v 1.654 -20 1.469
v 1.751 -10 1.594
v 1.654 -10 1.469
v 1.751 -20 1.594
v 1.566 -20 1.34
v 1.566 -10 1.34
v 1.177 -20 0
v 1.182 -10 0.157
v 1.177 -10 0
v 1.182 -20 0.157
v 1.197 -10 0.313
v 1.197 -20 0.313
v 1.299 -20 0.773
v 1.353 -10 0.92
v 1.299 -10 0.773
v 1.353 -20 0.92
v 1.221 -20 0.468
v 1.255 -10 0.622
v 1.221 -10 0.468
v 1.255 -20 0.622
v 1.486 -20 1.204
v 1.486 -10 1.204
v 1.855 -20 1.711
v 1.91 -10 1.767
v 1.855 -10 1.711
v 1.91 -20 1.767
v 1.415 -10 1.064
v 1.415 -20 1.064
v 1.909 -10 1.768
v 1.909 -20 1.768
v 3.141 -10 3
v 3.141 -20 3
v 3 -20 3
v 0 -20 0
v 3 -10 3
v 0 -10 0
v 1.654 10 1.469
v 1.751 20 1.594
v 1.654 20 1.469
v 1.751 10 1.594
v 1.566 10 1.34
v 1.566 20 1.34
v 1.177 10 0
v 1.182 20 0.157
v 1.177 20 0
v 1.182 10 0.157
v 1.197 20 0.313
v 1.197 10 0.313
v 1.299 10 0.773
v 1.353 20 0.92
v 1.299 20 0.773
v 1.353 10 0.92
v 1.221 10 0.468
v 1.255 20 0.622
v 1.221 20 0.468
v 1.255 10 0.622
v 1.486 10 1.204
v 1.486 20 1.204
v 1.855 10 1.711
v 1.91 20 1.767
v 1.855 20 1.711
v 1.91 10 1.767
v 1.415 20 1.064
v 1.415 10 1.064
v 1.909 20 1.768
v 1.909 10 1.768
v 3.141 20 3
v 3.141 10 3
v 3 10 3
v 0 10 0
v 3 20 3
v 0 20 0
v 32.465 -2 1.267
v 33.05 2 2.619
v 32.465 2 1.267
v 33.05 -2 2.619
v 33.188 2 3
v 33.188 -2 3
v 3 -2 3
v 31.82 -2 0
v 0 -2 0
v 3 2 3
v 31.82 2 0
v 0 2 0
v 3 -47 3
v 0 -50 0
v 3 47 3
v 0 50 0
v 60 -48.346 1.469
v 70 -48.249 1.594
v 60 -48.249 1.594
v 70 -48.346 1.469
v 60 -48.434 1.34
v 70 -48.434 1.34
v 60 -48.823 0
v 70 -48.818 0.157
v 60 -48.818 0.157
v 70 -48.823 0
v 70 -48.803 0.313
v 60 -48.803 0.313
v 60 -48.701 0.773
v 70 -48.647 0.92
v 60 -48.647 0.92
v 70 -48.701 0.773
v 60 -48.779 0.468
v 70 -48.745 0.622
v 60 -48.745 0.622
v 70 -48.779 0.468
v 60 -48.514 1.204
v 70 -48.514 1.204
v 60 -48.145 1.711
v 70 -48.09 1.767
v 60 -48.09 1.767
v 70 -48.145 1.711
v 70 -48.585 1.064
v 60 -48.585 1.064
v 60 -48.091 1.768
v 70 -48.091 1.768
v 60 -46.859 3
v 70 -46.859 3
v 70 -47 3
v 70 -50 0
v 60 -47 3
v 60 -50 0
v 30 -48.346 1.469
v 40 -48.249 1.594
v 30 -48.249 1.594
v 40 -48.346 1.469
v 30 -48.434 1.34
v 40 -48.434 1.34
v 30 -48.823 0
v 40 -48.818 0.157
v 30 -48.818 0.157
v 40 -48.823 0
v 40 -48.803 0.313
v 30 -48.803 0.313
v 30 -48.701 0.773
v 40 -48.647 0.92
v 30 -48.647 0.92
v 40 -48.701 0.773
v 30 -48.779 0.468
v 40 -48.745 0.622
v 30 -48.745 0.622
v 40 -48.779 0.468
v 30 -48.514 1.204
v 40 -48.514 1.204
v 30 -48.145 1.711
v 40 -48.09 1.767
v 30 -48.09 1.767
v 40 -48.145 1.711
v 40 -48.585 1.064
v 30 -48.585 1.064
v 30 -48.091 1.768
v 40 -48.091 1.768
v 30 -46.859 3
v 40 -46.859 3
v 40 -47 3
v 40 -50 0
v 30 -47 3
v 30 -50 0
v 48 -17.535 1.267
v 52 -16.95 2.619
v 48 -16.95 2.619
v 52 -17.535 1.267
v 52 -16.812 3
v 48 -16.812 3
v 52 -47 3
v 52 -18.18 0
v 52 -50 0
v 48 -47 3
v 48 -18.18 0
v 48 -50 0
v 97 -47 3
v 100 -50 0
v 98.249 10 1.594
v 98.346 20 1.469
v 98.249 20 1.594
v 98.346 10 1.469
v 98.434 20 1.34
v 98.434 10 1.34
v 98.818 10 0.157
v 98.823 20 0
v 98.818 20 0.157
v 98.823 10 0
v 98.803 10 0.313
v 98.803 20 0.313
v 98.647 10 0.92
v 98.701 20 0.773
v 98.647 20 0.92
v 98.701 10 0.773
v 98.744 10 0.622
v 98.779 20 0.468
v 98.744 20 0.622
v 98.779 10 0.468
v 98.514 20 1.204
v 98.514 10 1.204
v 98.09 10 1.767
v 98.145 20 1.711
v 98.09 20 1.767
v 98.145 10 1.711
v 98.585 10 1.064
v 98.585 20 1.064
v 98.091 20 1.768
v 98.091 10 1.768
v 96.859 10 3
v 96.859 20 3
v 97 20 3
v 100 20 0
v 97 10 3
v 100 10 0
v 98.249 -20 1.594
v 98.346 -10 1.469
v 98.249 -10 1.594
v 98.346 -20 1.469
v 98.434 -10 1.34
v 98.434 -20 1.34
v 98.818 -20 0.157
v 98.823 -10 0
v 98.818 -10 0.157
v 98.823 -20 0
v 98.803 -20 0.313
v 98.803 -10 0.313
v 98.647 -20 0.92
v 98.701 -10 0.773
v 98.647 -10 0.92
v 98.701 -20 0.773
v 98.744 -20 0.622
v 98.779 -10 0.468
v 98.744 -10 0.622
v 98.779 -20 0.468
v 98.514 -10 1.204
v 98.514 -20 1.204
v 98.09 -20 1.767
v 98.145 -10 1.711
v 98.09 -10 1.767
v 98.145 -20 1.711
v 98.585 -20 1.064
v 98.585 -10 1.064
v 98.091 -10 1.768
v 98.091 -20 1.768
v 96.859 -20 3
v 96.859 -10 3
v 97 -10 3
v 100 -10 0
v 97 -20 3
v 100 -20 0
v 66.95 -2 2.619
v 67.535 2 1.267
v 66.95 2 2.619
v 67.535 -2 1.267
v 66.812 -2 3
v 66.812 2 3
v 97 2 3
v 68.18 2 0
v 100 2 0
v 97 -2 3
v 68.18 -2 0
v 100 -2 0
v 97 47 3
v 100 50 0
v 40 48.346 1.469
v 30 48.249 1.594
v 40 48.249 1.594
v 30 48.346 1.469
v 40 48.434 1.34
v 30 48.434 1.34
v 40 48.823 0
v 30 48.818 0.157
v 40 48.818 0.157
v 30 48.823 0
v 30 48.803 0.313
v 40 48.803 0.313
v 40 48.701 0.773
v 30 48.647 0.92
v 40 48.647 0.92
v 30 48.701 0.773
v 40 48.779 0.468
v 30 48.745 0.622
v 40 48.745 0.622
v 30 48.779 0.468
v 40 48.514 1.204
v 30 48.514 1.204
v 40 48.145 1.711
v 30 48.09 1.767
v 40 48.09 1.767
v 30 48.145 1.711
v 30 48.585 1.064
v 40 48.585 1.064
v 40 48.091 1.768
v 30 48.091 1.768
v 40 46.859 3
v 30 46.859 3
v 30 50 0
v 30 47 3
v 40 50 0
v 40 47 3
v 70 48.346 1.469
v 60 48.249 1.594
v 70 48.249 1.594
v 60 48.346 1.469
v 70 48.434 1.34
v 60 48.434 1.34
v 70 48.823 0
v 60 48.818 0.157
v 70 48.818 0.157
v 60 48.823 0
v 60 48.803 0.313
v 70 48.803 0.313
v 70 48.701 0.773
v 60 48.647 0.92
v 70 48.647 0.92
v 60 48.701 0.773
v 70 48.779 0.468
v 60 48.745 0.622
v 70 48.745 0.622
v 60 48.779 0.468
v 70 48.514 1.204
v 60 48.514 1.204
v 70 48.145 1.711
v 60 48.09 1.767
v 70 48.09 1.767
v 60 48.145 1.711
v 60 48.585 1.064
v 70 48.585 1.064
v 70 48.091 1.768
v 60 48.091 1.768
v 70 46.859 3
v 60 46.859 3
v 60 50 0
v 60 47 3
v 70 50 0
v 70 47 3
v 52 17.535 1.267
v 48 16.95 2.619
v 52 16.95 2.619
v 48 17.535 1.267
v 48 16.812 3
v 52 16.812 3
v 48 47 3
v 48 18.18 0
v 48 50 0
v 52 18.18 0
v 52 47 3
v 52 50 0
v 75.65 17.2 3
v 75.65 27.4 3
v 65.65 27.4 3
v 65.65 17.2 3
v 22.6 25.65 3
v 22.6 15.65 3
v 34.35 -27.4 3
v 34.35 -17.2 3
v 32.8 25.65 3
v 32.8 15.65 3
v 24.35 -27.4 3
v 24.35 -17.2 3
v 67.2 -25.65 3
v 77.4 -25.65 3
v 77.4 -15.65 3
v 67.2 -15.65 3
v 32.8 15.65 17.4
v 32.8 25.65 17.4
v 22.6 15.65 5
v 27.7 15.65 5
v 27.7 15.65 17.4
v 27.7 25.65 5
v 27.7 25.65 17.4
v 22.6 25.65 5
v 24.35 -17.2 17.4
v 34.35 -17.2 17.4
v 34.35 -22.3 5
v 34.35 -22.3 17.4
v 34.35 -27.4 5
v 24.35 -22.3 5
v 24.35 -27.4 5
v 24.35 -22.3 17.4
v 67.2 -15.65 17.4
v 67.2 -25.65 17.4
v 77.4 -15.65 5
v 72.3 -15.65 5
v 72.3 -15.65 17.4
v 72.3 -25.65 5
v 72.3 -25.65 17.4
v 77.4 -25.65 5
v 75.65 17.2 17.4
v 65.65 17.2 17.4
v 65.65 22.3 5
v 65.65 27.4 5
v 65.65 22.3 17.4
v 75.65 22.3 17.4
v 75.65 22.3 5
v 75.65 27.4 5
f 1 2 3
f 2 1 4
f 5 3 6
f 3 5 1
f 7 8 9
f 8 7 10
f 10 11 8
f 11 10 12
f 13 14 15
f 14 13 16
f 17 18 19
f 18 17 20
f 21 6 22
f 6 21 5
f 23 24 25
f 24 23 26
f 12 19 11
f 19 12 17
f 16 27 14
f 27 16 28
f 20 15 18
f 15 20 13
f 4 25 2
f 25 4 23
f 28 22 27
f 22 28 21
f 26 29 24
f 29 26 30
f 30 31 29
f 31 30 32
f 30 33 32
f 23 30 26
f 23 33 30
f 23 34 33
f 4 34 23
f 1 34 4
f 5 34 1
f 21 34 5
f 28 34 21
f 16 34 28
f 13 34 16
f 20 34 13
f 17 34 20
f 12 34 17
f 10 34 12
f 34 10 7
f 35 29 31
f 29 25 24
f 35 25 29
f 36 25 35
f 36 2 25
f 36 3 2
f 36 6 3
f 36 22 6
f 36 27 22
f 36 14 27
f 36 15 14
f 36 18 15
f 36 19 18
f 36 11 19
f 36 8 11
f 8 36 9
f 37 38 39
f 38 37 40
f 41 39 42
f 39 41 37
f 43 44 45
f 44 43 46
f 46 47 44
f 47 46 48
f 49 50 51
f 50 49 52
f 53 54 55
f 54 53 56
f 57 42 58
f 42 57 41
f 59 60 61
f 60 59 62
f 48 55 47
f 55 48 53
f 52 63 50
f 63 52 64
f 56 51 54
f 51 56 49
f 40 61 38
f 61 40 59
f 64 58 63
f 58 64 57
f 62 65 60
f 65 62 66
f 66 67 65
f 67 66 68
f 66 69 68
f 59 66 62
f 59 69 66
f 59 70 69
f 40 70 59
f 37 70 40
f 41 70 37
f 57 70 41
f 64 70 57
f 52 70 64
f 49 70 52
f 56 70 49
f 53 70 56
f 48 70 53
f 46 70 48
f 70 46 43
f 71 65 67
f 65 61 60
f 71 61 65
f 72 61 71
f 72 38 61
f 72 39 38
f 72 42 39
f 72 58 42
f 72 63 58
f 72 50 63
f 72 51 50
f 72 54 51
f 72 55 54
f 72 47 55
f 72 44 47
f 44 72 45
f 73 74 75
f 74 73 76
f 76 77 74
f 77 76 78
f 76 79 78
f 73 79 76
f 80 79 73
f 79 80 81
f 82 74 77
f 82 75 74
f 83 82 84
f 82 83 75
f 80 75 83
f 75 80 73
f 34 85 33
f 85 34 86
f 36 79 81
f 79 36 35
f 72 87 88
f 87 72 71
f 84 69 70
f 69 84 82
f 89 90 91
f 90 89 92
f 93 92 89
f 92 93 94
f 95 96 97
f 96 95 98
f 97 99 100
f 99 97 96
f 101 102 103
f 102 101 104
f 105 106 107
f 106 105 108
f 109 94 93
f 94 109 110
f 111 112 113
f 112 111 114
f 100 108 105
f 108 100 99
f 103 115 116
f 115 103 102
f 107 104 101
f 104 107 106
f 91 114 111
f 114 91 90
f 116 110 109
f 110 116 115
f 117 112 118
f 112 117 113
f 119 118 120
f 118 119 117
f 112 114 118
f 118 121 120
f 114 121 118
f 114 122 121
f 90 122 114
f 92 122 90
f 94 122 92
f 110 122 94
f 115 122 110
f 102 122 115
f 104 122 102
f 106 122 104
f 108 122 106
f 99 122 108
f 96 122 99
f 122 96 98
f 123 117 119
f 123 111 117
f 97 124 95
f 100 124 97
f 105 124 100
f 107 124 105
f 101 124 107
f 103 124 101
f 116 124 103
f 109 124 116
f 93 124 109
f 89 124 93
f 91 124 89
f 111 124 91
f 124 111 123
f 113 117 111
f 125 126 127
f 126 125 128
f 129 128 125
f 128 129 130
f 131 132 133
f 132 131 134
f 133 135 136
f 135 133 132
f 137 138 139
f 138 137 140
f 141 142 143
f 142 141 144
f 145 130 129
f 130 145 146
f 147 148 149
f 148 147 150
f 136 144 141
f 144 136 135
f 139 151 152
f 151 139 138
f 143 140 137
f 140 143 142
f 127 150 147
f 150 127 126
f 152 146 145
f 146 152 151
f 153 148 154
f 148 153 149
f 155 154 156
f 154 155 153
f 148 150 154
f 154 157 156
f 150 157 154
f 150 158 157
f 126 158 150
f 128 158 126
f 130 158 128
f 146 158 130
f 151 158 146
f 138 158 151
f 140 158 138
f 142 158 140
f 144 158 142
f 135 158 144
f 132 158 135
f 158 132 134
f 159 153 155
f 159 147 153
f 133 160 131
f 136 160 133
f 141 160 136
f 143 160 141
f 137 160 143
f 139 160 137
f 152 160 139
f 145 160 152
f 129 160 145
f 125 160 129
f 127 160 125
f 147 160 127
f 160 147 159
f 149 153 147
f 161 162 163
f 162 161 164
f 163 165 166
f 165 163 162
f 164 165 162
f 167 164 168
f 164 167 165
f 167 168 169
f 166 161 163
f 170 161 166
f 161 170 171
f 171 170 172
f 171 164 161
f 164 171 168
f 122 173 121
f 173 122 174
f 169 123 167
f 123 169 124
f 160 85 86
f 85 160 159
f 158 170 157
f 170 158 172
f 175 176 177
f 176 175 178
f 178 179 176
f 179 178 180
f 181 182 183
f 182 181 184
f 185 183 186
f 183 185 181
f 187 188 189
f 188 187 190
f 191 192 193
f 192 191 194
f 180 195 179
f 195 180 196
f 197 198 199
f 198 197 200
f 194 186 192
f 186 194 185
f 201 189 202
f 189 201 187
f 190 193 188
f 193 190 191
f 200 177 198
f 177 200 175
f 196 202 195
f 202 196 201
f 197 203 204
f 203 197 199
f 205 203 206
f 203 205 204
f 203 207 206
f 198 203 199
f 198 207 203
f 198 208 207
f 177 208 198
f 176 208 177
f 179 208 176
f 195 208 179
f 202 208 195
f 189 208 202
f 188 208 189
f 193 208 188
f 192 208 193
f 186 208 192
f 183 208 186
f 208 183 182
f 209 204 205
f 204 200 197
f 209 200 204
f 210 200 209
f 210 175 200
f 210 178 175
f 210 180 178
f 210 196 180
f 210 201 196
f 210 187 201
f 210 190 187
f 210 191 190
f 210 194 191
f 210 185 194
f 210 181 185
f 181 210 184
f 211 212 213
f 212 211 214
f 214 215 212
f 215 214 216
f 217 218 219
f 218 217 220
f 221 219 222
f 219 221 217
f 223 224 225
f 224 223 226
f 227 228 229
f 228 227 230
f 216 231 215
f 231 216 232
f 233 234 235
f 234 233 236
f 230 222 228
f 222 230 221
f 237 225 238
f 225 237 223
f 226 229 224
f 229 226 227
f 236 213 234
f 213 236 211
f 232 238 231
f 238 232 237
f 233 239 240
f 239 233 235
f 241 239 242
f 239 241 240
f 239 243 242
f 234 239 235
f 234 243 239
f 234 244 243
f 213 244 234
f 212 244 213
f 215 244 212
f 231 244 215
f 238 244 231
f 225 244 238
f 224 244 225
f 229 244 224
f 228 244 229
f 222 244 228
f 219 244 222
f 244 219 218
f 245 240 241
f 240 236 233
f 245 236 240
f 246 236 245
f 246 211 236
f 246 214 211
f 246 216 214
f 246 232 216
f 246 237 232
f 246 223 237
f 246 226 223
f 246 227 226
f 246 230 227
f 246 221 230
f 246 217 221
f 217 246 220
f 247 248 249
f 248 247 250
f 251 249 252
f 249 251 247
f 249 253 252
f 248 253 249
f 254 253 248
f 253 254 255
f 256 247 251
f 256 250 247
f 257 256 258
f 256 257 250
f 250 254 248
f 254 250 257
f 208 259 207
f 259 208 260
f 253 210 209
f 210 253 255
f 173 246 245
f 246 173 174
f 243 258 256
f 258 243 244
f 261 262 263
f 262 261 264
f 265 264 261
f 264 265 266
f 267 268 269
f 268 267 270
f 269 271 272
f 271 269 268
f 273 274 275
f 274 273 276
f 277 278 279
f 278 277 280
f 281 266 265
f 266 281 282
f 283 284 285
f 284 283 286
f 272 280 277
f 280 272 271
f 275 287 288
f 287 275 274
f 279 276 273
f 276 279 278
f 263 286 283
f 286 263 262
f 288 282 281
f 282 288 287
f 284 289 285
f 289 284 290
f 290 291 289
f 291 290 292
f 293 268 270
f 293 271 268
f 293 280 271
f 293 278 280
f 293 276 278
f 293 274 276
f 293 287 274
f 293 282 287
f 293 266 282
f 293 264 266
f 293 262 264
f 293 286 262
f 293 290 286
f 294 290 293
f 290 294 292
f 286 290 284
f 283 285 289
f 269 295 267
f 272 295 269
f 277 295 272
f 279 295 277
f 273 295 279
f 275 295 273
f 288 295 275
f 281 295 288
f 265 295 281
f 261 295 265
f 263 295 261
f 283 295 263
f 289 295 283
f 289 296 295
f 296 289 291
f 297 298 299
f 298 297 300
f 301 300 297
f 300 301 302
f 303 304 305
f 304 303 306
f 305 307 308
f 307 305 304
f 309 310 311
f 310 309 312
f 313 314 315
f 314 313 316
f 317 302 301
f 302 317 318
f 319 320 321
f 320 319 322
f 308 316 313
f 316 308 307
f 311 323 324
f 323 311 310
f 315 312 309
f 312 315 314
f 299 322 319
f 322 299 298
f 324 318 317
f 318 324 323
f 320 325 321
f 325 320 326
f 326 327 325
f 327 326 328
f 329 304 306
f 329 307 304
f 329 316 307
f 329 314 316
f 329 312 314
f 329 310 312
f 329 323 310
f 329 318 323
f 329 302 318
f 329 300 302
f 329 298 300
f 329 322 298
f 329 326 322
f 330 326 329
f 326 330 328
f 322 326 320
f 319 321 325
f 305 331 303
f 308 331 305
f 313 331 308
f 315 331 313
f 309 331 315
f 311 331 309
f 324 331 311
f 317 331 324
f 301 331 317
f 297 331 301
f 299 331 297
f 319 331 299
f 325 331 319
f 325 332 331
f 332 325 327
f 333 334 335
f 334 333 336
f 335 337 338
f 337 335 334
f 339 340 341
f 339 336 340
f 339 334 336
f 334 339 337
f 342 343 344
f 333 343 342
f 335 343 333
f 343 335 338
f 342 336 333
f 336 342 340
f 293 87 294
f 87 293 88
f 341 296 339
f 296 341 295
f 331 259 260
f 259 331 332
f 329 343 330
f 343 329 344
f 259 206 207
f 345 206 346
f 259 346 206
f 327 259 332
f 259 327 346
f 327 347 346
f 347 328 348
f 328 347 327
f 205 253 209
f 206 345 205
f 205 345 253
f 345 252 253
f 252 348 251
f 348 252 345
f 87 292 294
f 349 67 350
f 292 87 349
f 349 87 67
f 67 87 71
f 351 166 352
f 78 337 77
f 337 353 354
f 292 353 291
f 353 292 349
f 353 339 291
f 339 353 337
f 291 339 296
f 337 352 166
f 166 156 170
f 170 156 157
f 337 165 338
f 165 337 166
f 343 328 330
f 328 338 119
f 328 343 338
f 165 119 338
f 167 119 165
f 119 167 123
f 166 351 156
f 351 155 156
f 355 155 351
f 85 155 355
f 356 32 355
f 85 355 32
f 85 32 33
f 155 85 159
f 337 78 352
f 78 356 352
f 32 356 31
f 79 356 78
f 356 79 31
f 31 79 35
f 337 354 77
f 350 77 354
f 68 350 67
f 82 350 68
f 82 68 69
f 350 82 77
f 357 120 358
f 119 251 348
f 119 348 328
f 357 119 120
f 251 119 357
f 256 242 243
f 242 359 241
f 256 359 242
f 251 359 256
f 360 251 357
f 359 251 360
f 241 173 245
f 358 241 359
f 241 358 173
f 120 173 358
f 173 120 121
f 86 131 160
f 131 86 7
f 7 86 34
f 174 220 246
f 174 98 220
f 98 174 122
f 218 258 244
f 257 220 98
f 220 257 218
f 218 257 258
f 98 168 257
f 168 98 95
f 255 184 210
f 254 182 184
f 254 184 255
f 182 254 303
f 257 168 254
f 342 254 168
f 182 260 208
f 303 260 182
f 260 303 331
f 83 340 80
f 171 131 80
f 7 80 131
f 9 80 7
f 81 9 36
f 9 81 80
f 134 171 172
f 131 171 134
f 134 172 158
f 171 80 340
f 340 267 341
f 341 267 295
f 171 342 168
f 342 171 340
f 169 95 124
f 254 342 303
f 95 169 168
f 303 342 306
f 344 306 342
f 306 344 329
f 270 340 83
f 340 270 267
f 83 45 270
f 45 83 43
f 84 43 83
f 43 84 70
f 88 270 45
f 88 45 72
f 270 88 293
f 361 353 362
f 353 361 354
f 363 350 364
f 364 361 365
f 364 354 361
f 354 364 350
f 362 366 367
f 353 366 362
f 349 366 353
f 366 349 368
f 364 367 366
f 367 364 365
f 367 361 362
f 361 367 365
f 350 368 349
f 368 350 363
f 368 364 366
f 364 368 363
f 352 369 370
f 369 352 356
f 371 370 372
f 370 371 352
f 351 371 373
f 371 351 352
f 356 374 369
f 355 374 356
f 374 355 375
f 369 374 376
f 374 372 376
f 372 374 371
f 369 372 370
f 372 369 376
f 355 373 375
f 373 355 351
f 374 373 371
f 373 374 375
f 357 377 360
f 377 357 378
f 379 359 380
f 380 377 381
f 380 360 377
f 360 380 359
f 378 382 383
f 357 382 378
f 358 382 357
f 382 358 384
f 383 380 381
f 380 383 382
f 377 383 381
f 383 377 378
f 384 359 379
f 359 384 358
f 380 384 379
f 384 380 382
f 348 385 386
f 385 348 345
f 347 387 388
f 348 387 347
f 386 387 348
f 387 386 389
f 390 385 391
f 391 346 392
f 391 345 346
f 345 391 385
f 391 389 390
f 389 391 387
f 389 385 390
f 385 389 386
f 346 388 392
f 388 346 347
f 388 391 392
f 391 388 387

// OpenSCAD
// file: ../servo.scad
diff = 1;  // For holes.

servo_length = 22.5;
servo_width = 12.3;
servo_height = 23.5;

servo_mountsTop = 19.3;
servo_mountsThickness = 2.3;
servo_mountsOut = 5.1;
servo_mountsHoleWidth = 2.8;
servo_mountsSlotWidth = 1;

servo_gearholderHeight = 4.3;
servo_gearholderRadius = servo_width / 2;
servo_gearholderInset = servo_gearholderRadius;
servo_gearholderSmallRadius = 2.5;
servo_gearholderSmallOffset = servo_gearholderRadius * 2;

servo_hornStubHeight = 3.5;
servo_hornStubRadius = 2.3;

servo_armThickness = 1.4;
servo_armStalkRadius = 3.5;
servo_armStalkHeight = 3.9;
servo_armStalkAboutBase = 0.75;
servo_armHornHoleRadius = 0.4;
servo_armHoleSpacing = 2;
servo_bigArmBigRadius = 3.5;
servo_bigArmBigRadiusOut = 1;
servo_bigArmSmallRadius = 1.8;
servo_bigArmCentersLength = 16.9;
servo_bigArmHornHoleCount = 7;
servo_smallArmBigRadius = 1.8;
servo_smallArmBigRadiusOut = 0;
servo_smallArmSmallRadius = 1.8;
servo_smallArmCentersLength = 6.8;
servo_smallArmHornHoleCount = 2;

servo_wireFromBottom = 1.5;
servo_wireWidth = 3.6;

servo_totalHeight = servo_height + servo_gearholderHeight + servo_armStalkAboutBase + servo_armStalkHeight;

module sg90Servo(rotation) {

    translate([-servo_gearholderRadius, -servo_gearholderRadius, -servo_totalHeight]) {
        color([0, 0, 0.7]) {
            _chassis();
            _clusterProtrusion();
        }

        _wireStub();

        color([1, 1, 1]) {
            _horn();
            translate([servo_width / 2, servo_width / 2, servo_height + servo_gearholderHeight + servo_armStalkAboutBase]) {
                _arm(rotation, true);
            }
        }
    }
}

module _chassis() {
    cube([servo_length, servo_width, servo_height]);

    translate([-servo_mountsOut, 0, servo_mountsTop - servo_mountsThickness]) {
        difference() {
            cube([servo_length + (servo_mountsOut * 2), servo_width, servo_mountsThickness]);

            // Mount hole/slot.
            translate([servo_mountsOut / 2, servo_width / 2, -diff]) {
                cylinder(r=servo_mountsHoleWidth / 2, h=servo_mountsThickness + (diff*2));
            }
            translate([-diff, (servo_width / 2) - (servo_mountsSlotWidth / 2), -diff]) {
                cube([(servo_mountsOut / 2) + diff, servo_mountsSlotWidth, servo_mountsThickness + (diff*2)]);
            }
            translate([servo_length + servo_mountsOut, 0, 0]) {
                translate([servo_mountsOut / 2, servo_width / 2, -diff]) {
                    cylinder(r=servo_mountsHoleWidth / 2, h=servo_mountsThickness + (diff*2));
                }
                translate([(servo_mountsOut / 2), (servo_width / 2) - (servo_mountsSlotWidth / 2), -diff]) {
                    cube([(servo_mountsOut / 2) + diff, servo_mountsSlotWidth, servo_mountsThickness + (diff*2)]);
                }
            }
        }
    }
}

module _wireStub() {
    translate([0, servo_width / 2, servo_wireFromBottom]) {
        rotate([0, -90, 0]) {
            color([1, 0, 0]) cylinder(h=servo_wireWidth / 3, r=servo_wireWidth / 6);
            color([0.5, 0.25, 0.25]) translate([0, -servo_wireWidth / 3, 0]) cylinder(h=servo_wireWidth / 3, r=servo_wireWidth / 6);
            color([1, 1, 0.5]) translate([0, servo_wireWidth / 3, 0]) cylinder(h=servo_wireWidth / 3, r=servo_wireWidth / 6);
        }
    }
}

module _clusterProtrusion() {
    translate([servo_gearholderInset, servo_width / 2, servo_height]) {
        cylinder(h=servo_gearholderHeight, r=servo_gearholderRadius);
    }

    translate([servo_gearholderSmallOffset, servo_width / 2, servo_height]) {
        cylinder(h=servo_gearholderHeight, r=servo_gearholderSmallRadius);
    }
}

module _horn() {
    translate([servo_width / 2, servo_width / 2, servo_height + servo_gearholderHeight]) {
        cylinder(h=servo_hornStubHeight, r=servo_hornStubRadius);
    }
}

module _arm(rotation, holes) {
    cylinder(h=servo_armStalkHeight, r=servo_armStalkRadius);

    difference() {
        hull() {
            translate([0, 0, servo_armStalkHeight - servo_armThickness]) {
                rotate([0, 0, rotation]) {
                    translate([servo_bigArmBigRadiusOut, -servo_bigArmBigRadius, 0]) cube([0.1, servo_bigArmBigRadius*2, servo_armThickness]);
                    translate([servo_bigArmCentersLength, 0, 0]) {
                        cylinder(h=servo_armThickness, r=servo_bigArmSmallRadius);
                    }
                }
            }
        }

        if (holes) {
            for(offset = [0:servo_bigArmHornHoleCount])  {
                translate([0, 0, servo_armStalkHeight - servo_armThickness - 1]) {
                    rotate([0, 0, rotation]) {
                        translate([servo_bigArmCentersLength - (servo_armHoleSpacing * offset), 0, 0]) {
                            cylinder(h=servo_armThickness + 2, r=servo_armHornHoleRadius);
                        }
                    }
                }
            }
        }
    }
    
    rotate([0, 0, 90]) difference() {
        hull() {
            translate([0, 0, servo_armStalkHeight - servo_armThickness]) {
                rotate([0, 0, rotation]) {
                    translate([servo_smallArmBigRadiusOut, -servo_smallArmBigRadius, 0]) cube([0.01, servo_smallArmBigRadius*2, servo_armThickness]);
                    translate([servo_smallArmCentersLength, 0, 0]) {
                        cylinder(h=servo_armThickness, r=servo_smallArmSmallRadius);
                    }
                }
            }
        }

        if (holes) {
            for(offset = [0:servo_smallArmHornHoleCount])  {
                translate([0, 0, servo_armStalkHeight - servo_armThickness - 1]) {
                    rotate([0, 0, rotation]) {
                        translate([servo_smallArmCentersLength - (servo_armHoleSpacing * offset), 0, 0]) {
                            cylinder(h=servo_armThickness + 2, r=servo_armHornHoleRadius);
                        }
                    }
                }
            }
        }
    }       
    
    rotate([0, 0, -90]) difference() {
        hull() {
            translate([0, 0, servo_armStalkHeight - servo_armThickness]) {
                rotate([0, 0, rotation]) {
                    translate([servo_smallArmBigRadiusOut, -servo_smallArmBigRadius, 0]) cube([0.01, servo_smallArmBigRadius*2, servo_armThickness]);
                    translate([servo_smallArmCentersLength, 0, 0]) {
                        cylinder(h=servo_armThickness, r=servo_smallArmSmallRadius);
                    }
                }
            }
        }

        if (holes) {
            for(offset = [0:servo_smallArmHornHoleCount])  {
                translate([0, 0, servo_armStalkHeight - servo_armThickness - 1]) {
                    rotate([0, 0, rotation]) {
                        translate([servo_smallArmCentersLength - (servo_armHoleSpacing * offset), 0, 0]) {
                            cylinder(h=servo_armThickness + 2, r=servo_armHornHoleRadius);
                        }
                    }
                }
            }
        }
    }       
}

//$fn=100;
//sg90Servo(0);
//_arm(45, true);
// file: ../magicbox.scad
include <servo.scad>;

// For making holes.
slot_diff = 1;

// For spacing moving parts.
fit_gaps = 0.1;
motion_gaps = 0.5;

cam_axis_inset_from_wall_outside = servo_mountsOut + servo_gearholderInset;
cam_radius = cam_axis_inset_from_wall_outside;
cam_flat_length = 20;
cam_outer_radius = sqrt(pow(cam_radius, 2) + pow(cam_flat_length, 2));
cam_thickness = 3;

wall_thickness = 3;
box_size = (servo_totalHeight + wall_thickness + (cam_thickness / 2) - servo_armThickness) * 2;

hinge_radius = 2.5;
hinge_gap = 0.2;
hinge_height = 10;
hinge_axis_sep = 10;

module box(cam_angle) {
    color("silver") side_with_servo_rear_mount();
    rotate([0, 0, 90]) color("silver") side_with_servo_mount_slot();

    translate([cam_axis_inset_from_wall_outside, cam_axis_inset_from_wall_outside, -cam_thickness/2 + servo_armThickness]) sg90Servo(cam_angle+45);
    translate([cam_radius, cam_radius, -cam_thickness/2]) color("yellow") rotate([0, 0, 180 + cam_angle]) cam();
}

module side_with_servo_mount_slot() {
    mirror([0, 1, 0]) difference() {
        side();
        translate([box_size/2, 0, 0]) for(index = [0:4])  {
            rotate([0, index*90, 0]) {
                translate([-box_size/2, 0, 0]) translate([cam_axis_inset_from_wall_outside - (servo_width/2) - fit_gaps, -slot_diff, -servo_mountsTop+servo_mountsThickness+servo_armThickness+fit_gaps*2]) {
                    cube([servo_width + fit_gaps*2, wall_thickness + slot_diff*2, servo_mountsThickness + fit_gaps*2]);
                }
            }
        }
    }
}

module side_with_servo_rear_mount() {
    side();
    translate([box_size/2, 0, 0]) for(index = [0:4])  {
        rotate([0, index*90, 0]) {
            translate([-box_size/2, 0, 0]) translate([servo_length + servo_mountsOut + fit_gaps, 0, -servo_totalHeight + servo_mountsTop - cam_thickness/2 + servo_armThickness - servo_mountsThickness - fit_gaps - 10]) {
                 cube([servo_mountsOut, servo_mountsOut+servo_width, 10]);
            }
            translate([-box_size/2, 0, 0]) translate([servo_length + fit_gaps, 0, -servo_totalHeight + servo_mountsTop - cam_thickness/2 + servo_armThickness - servo_mountsThickness - fit_gaps - 10]) {
                 cube([servo_mountsOut, servo_mountsOut - fit_gaps, 10]);
            }
        }
    }
}

module side() {
    height = box_size;
    difference() {
        translate([0, 0, -height/2]) cube([box_size, wall_thickness, height]);
        union() {
            translate([box_size/2, 0, 0]) for(index = [0:4])  {
                rotate([0, index*90, 0]) {
                    translate([-box_size/2, 0, 0]) {                        
                        translate([cam_axis_inset_from_wall_outside, cam_axis_inset_from_wall_outside, -(cam_thickness/2 + motion_gaps)]) {
                            cylinder(r=cam_outer_radius + motion_gaps, h=cam_thickness + (motion_gaps*2));
                        }
                        translate([0, 0, hinge_axis_sep]) hinge_slot();
                        translate([0, 0, -hinge_axis_sep-hinge_height]) hinge_slot();
                        translate([0, 0, -height/2 - slot_diff]) rotate([0, 0, 45]) translate([-slot_diff, 0, 0]) cube([pow(wall_thickness,2), pow(wall_thickness,2), height + slot_diff*2]);
                    }
                }
            }
        }
    }
}

module hinge_slot() {
    inset = sqrt(2 * pow(hinge_radius + hinge_gap/2, 2));
    difference(){
        translate([-slot_diff, -slot_diff, 0]) cube([inset+slot_diff, inset+slot_diff, hinge_height]);
        union() {
            translate([inset, 0, -slot_diff]) {
                cylinder(r=hinge_radius, h=hinge_height + slot_diff*2);
                rotate([0, 0, 45]) translate([0, -hinge_radius, 0]) cube([hinge_radius*2, hinge_radius*2, hinge_height + slot_diff*2]);
            }
        }
    }
}

module cam() {
    rotate([0, 0, -90]) {
        difference() {
            hull() {
                cylinder(r=cam_radius, h=cam_thickness);
                difference() {   
                    cylinder(r=cam_outer_radius, h=cam_thickness);
                    union() {
                        rotate([0, 0, 90]) translate([0, -cam_flat_length, -slot_diff]) cube([cam_outer_radius * 2, cam_outer_radius * 2, cam_thickness * 2]);
                        rotate([0, 0, 90]) mirror([1, -1, 0]) translate([0, -cam_flat_length, -slot_diff]) cube([cam_outer_radius * 2, cam_outer_radius * 2, cam_thickness * 2]);
                    }
                }
            }
            translate([0, 0, - servo_armStalkHeight + servo_armThickness - 0.5]) {
                scale([1.02, 1.02, 1.02]) _arm(-45, false);
            }
        }
    }
}

function separation_angle(d, r, c) =
    d < acos(r/c) ?
        -2 * atan((c * sin(90 - acos(r/c) + d) - r) / (r + sqrt(pow(c,2)- pow(c * sin(90 - acos(r/c) + d), 2))))
        :
        -2 * atan((c * sin(90 - acos(r/c) + d) - r) / (r - sqrt(pow(c,2)- pow(c * sin(90 - acos(r/c) + d), 2))));

module hinge_pair(cam_rotation) {
    box_angle = separation_angle(cam_rotation, cam_radius, cam_outer_radius);
    box(cam_rotation);
    rotate([0, 180, -box_angle]) box(cam_rotation);
}

//$fn=100;
//cam();
//box(0);
//side();
//hinge_pair(15);
//side_with_servo_mount_slot();
// main file
include <../magicbox.scad>; 
$fn = 100; box_size = 100; rotate([90, 0, 0]) side_with_servo_rear_mount(); 
